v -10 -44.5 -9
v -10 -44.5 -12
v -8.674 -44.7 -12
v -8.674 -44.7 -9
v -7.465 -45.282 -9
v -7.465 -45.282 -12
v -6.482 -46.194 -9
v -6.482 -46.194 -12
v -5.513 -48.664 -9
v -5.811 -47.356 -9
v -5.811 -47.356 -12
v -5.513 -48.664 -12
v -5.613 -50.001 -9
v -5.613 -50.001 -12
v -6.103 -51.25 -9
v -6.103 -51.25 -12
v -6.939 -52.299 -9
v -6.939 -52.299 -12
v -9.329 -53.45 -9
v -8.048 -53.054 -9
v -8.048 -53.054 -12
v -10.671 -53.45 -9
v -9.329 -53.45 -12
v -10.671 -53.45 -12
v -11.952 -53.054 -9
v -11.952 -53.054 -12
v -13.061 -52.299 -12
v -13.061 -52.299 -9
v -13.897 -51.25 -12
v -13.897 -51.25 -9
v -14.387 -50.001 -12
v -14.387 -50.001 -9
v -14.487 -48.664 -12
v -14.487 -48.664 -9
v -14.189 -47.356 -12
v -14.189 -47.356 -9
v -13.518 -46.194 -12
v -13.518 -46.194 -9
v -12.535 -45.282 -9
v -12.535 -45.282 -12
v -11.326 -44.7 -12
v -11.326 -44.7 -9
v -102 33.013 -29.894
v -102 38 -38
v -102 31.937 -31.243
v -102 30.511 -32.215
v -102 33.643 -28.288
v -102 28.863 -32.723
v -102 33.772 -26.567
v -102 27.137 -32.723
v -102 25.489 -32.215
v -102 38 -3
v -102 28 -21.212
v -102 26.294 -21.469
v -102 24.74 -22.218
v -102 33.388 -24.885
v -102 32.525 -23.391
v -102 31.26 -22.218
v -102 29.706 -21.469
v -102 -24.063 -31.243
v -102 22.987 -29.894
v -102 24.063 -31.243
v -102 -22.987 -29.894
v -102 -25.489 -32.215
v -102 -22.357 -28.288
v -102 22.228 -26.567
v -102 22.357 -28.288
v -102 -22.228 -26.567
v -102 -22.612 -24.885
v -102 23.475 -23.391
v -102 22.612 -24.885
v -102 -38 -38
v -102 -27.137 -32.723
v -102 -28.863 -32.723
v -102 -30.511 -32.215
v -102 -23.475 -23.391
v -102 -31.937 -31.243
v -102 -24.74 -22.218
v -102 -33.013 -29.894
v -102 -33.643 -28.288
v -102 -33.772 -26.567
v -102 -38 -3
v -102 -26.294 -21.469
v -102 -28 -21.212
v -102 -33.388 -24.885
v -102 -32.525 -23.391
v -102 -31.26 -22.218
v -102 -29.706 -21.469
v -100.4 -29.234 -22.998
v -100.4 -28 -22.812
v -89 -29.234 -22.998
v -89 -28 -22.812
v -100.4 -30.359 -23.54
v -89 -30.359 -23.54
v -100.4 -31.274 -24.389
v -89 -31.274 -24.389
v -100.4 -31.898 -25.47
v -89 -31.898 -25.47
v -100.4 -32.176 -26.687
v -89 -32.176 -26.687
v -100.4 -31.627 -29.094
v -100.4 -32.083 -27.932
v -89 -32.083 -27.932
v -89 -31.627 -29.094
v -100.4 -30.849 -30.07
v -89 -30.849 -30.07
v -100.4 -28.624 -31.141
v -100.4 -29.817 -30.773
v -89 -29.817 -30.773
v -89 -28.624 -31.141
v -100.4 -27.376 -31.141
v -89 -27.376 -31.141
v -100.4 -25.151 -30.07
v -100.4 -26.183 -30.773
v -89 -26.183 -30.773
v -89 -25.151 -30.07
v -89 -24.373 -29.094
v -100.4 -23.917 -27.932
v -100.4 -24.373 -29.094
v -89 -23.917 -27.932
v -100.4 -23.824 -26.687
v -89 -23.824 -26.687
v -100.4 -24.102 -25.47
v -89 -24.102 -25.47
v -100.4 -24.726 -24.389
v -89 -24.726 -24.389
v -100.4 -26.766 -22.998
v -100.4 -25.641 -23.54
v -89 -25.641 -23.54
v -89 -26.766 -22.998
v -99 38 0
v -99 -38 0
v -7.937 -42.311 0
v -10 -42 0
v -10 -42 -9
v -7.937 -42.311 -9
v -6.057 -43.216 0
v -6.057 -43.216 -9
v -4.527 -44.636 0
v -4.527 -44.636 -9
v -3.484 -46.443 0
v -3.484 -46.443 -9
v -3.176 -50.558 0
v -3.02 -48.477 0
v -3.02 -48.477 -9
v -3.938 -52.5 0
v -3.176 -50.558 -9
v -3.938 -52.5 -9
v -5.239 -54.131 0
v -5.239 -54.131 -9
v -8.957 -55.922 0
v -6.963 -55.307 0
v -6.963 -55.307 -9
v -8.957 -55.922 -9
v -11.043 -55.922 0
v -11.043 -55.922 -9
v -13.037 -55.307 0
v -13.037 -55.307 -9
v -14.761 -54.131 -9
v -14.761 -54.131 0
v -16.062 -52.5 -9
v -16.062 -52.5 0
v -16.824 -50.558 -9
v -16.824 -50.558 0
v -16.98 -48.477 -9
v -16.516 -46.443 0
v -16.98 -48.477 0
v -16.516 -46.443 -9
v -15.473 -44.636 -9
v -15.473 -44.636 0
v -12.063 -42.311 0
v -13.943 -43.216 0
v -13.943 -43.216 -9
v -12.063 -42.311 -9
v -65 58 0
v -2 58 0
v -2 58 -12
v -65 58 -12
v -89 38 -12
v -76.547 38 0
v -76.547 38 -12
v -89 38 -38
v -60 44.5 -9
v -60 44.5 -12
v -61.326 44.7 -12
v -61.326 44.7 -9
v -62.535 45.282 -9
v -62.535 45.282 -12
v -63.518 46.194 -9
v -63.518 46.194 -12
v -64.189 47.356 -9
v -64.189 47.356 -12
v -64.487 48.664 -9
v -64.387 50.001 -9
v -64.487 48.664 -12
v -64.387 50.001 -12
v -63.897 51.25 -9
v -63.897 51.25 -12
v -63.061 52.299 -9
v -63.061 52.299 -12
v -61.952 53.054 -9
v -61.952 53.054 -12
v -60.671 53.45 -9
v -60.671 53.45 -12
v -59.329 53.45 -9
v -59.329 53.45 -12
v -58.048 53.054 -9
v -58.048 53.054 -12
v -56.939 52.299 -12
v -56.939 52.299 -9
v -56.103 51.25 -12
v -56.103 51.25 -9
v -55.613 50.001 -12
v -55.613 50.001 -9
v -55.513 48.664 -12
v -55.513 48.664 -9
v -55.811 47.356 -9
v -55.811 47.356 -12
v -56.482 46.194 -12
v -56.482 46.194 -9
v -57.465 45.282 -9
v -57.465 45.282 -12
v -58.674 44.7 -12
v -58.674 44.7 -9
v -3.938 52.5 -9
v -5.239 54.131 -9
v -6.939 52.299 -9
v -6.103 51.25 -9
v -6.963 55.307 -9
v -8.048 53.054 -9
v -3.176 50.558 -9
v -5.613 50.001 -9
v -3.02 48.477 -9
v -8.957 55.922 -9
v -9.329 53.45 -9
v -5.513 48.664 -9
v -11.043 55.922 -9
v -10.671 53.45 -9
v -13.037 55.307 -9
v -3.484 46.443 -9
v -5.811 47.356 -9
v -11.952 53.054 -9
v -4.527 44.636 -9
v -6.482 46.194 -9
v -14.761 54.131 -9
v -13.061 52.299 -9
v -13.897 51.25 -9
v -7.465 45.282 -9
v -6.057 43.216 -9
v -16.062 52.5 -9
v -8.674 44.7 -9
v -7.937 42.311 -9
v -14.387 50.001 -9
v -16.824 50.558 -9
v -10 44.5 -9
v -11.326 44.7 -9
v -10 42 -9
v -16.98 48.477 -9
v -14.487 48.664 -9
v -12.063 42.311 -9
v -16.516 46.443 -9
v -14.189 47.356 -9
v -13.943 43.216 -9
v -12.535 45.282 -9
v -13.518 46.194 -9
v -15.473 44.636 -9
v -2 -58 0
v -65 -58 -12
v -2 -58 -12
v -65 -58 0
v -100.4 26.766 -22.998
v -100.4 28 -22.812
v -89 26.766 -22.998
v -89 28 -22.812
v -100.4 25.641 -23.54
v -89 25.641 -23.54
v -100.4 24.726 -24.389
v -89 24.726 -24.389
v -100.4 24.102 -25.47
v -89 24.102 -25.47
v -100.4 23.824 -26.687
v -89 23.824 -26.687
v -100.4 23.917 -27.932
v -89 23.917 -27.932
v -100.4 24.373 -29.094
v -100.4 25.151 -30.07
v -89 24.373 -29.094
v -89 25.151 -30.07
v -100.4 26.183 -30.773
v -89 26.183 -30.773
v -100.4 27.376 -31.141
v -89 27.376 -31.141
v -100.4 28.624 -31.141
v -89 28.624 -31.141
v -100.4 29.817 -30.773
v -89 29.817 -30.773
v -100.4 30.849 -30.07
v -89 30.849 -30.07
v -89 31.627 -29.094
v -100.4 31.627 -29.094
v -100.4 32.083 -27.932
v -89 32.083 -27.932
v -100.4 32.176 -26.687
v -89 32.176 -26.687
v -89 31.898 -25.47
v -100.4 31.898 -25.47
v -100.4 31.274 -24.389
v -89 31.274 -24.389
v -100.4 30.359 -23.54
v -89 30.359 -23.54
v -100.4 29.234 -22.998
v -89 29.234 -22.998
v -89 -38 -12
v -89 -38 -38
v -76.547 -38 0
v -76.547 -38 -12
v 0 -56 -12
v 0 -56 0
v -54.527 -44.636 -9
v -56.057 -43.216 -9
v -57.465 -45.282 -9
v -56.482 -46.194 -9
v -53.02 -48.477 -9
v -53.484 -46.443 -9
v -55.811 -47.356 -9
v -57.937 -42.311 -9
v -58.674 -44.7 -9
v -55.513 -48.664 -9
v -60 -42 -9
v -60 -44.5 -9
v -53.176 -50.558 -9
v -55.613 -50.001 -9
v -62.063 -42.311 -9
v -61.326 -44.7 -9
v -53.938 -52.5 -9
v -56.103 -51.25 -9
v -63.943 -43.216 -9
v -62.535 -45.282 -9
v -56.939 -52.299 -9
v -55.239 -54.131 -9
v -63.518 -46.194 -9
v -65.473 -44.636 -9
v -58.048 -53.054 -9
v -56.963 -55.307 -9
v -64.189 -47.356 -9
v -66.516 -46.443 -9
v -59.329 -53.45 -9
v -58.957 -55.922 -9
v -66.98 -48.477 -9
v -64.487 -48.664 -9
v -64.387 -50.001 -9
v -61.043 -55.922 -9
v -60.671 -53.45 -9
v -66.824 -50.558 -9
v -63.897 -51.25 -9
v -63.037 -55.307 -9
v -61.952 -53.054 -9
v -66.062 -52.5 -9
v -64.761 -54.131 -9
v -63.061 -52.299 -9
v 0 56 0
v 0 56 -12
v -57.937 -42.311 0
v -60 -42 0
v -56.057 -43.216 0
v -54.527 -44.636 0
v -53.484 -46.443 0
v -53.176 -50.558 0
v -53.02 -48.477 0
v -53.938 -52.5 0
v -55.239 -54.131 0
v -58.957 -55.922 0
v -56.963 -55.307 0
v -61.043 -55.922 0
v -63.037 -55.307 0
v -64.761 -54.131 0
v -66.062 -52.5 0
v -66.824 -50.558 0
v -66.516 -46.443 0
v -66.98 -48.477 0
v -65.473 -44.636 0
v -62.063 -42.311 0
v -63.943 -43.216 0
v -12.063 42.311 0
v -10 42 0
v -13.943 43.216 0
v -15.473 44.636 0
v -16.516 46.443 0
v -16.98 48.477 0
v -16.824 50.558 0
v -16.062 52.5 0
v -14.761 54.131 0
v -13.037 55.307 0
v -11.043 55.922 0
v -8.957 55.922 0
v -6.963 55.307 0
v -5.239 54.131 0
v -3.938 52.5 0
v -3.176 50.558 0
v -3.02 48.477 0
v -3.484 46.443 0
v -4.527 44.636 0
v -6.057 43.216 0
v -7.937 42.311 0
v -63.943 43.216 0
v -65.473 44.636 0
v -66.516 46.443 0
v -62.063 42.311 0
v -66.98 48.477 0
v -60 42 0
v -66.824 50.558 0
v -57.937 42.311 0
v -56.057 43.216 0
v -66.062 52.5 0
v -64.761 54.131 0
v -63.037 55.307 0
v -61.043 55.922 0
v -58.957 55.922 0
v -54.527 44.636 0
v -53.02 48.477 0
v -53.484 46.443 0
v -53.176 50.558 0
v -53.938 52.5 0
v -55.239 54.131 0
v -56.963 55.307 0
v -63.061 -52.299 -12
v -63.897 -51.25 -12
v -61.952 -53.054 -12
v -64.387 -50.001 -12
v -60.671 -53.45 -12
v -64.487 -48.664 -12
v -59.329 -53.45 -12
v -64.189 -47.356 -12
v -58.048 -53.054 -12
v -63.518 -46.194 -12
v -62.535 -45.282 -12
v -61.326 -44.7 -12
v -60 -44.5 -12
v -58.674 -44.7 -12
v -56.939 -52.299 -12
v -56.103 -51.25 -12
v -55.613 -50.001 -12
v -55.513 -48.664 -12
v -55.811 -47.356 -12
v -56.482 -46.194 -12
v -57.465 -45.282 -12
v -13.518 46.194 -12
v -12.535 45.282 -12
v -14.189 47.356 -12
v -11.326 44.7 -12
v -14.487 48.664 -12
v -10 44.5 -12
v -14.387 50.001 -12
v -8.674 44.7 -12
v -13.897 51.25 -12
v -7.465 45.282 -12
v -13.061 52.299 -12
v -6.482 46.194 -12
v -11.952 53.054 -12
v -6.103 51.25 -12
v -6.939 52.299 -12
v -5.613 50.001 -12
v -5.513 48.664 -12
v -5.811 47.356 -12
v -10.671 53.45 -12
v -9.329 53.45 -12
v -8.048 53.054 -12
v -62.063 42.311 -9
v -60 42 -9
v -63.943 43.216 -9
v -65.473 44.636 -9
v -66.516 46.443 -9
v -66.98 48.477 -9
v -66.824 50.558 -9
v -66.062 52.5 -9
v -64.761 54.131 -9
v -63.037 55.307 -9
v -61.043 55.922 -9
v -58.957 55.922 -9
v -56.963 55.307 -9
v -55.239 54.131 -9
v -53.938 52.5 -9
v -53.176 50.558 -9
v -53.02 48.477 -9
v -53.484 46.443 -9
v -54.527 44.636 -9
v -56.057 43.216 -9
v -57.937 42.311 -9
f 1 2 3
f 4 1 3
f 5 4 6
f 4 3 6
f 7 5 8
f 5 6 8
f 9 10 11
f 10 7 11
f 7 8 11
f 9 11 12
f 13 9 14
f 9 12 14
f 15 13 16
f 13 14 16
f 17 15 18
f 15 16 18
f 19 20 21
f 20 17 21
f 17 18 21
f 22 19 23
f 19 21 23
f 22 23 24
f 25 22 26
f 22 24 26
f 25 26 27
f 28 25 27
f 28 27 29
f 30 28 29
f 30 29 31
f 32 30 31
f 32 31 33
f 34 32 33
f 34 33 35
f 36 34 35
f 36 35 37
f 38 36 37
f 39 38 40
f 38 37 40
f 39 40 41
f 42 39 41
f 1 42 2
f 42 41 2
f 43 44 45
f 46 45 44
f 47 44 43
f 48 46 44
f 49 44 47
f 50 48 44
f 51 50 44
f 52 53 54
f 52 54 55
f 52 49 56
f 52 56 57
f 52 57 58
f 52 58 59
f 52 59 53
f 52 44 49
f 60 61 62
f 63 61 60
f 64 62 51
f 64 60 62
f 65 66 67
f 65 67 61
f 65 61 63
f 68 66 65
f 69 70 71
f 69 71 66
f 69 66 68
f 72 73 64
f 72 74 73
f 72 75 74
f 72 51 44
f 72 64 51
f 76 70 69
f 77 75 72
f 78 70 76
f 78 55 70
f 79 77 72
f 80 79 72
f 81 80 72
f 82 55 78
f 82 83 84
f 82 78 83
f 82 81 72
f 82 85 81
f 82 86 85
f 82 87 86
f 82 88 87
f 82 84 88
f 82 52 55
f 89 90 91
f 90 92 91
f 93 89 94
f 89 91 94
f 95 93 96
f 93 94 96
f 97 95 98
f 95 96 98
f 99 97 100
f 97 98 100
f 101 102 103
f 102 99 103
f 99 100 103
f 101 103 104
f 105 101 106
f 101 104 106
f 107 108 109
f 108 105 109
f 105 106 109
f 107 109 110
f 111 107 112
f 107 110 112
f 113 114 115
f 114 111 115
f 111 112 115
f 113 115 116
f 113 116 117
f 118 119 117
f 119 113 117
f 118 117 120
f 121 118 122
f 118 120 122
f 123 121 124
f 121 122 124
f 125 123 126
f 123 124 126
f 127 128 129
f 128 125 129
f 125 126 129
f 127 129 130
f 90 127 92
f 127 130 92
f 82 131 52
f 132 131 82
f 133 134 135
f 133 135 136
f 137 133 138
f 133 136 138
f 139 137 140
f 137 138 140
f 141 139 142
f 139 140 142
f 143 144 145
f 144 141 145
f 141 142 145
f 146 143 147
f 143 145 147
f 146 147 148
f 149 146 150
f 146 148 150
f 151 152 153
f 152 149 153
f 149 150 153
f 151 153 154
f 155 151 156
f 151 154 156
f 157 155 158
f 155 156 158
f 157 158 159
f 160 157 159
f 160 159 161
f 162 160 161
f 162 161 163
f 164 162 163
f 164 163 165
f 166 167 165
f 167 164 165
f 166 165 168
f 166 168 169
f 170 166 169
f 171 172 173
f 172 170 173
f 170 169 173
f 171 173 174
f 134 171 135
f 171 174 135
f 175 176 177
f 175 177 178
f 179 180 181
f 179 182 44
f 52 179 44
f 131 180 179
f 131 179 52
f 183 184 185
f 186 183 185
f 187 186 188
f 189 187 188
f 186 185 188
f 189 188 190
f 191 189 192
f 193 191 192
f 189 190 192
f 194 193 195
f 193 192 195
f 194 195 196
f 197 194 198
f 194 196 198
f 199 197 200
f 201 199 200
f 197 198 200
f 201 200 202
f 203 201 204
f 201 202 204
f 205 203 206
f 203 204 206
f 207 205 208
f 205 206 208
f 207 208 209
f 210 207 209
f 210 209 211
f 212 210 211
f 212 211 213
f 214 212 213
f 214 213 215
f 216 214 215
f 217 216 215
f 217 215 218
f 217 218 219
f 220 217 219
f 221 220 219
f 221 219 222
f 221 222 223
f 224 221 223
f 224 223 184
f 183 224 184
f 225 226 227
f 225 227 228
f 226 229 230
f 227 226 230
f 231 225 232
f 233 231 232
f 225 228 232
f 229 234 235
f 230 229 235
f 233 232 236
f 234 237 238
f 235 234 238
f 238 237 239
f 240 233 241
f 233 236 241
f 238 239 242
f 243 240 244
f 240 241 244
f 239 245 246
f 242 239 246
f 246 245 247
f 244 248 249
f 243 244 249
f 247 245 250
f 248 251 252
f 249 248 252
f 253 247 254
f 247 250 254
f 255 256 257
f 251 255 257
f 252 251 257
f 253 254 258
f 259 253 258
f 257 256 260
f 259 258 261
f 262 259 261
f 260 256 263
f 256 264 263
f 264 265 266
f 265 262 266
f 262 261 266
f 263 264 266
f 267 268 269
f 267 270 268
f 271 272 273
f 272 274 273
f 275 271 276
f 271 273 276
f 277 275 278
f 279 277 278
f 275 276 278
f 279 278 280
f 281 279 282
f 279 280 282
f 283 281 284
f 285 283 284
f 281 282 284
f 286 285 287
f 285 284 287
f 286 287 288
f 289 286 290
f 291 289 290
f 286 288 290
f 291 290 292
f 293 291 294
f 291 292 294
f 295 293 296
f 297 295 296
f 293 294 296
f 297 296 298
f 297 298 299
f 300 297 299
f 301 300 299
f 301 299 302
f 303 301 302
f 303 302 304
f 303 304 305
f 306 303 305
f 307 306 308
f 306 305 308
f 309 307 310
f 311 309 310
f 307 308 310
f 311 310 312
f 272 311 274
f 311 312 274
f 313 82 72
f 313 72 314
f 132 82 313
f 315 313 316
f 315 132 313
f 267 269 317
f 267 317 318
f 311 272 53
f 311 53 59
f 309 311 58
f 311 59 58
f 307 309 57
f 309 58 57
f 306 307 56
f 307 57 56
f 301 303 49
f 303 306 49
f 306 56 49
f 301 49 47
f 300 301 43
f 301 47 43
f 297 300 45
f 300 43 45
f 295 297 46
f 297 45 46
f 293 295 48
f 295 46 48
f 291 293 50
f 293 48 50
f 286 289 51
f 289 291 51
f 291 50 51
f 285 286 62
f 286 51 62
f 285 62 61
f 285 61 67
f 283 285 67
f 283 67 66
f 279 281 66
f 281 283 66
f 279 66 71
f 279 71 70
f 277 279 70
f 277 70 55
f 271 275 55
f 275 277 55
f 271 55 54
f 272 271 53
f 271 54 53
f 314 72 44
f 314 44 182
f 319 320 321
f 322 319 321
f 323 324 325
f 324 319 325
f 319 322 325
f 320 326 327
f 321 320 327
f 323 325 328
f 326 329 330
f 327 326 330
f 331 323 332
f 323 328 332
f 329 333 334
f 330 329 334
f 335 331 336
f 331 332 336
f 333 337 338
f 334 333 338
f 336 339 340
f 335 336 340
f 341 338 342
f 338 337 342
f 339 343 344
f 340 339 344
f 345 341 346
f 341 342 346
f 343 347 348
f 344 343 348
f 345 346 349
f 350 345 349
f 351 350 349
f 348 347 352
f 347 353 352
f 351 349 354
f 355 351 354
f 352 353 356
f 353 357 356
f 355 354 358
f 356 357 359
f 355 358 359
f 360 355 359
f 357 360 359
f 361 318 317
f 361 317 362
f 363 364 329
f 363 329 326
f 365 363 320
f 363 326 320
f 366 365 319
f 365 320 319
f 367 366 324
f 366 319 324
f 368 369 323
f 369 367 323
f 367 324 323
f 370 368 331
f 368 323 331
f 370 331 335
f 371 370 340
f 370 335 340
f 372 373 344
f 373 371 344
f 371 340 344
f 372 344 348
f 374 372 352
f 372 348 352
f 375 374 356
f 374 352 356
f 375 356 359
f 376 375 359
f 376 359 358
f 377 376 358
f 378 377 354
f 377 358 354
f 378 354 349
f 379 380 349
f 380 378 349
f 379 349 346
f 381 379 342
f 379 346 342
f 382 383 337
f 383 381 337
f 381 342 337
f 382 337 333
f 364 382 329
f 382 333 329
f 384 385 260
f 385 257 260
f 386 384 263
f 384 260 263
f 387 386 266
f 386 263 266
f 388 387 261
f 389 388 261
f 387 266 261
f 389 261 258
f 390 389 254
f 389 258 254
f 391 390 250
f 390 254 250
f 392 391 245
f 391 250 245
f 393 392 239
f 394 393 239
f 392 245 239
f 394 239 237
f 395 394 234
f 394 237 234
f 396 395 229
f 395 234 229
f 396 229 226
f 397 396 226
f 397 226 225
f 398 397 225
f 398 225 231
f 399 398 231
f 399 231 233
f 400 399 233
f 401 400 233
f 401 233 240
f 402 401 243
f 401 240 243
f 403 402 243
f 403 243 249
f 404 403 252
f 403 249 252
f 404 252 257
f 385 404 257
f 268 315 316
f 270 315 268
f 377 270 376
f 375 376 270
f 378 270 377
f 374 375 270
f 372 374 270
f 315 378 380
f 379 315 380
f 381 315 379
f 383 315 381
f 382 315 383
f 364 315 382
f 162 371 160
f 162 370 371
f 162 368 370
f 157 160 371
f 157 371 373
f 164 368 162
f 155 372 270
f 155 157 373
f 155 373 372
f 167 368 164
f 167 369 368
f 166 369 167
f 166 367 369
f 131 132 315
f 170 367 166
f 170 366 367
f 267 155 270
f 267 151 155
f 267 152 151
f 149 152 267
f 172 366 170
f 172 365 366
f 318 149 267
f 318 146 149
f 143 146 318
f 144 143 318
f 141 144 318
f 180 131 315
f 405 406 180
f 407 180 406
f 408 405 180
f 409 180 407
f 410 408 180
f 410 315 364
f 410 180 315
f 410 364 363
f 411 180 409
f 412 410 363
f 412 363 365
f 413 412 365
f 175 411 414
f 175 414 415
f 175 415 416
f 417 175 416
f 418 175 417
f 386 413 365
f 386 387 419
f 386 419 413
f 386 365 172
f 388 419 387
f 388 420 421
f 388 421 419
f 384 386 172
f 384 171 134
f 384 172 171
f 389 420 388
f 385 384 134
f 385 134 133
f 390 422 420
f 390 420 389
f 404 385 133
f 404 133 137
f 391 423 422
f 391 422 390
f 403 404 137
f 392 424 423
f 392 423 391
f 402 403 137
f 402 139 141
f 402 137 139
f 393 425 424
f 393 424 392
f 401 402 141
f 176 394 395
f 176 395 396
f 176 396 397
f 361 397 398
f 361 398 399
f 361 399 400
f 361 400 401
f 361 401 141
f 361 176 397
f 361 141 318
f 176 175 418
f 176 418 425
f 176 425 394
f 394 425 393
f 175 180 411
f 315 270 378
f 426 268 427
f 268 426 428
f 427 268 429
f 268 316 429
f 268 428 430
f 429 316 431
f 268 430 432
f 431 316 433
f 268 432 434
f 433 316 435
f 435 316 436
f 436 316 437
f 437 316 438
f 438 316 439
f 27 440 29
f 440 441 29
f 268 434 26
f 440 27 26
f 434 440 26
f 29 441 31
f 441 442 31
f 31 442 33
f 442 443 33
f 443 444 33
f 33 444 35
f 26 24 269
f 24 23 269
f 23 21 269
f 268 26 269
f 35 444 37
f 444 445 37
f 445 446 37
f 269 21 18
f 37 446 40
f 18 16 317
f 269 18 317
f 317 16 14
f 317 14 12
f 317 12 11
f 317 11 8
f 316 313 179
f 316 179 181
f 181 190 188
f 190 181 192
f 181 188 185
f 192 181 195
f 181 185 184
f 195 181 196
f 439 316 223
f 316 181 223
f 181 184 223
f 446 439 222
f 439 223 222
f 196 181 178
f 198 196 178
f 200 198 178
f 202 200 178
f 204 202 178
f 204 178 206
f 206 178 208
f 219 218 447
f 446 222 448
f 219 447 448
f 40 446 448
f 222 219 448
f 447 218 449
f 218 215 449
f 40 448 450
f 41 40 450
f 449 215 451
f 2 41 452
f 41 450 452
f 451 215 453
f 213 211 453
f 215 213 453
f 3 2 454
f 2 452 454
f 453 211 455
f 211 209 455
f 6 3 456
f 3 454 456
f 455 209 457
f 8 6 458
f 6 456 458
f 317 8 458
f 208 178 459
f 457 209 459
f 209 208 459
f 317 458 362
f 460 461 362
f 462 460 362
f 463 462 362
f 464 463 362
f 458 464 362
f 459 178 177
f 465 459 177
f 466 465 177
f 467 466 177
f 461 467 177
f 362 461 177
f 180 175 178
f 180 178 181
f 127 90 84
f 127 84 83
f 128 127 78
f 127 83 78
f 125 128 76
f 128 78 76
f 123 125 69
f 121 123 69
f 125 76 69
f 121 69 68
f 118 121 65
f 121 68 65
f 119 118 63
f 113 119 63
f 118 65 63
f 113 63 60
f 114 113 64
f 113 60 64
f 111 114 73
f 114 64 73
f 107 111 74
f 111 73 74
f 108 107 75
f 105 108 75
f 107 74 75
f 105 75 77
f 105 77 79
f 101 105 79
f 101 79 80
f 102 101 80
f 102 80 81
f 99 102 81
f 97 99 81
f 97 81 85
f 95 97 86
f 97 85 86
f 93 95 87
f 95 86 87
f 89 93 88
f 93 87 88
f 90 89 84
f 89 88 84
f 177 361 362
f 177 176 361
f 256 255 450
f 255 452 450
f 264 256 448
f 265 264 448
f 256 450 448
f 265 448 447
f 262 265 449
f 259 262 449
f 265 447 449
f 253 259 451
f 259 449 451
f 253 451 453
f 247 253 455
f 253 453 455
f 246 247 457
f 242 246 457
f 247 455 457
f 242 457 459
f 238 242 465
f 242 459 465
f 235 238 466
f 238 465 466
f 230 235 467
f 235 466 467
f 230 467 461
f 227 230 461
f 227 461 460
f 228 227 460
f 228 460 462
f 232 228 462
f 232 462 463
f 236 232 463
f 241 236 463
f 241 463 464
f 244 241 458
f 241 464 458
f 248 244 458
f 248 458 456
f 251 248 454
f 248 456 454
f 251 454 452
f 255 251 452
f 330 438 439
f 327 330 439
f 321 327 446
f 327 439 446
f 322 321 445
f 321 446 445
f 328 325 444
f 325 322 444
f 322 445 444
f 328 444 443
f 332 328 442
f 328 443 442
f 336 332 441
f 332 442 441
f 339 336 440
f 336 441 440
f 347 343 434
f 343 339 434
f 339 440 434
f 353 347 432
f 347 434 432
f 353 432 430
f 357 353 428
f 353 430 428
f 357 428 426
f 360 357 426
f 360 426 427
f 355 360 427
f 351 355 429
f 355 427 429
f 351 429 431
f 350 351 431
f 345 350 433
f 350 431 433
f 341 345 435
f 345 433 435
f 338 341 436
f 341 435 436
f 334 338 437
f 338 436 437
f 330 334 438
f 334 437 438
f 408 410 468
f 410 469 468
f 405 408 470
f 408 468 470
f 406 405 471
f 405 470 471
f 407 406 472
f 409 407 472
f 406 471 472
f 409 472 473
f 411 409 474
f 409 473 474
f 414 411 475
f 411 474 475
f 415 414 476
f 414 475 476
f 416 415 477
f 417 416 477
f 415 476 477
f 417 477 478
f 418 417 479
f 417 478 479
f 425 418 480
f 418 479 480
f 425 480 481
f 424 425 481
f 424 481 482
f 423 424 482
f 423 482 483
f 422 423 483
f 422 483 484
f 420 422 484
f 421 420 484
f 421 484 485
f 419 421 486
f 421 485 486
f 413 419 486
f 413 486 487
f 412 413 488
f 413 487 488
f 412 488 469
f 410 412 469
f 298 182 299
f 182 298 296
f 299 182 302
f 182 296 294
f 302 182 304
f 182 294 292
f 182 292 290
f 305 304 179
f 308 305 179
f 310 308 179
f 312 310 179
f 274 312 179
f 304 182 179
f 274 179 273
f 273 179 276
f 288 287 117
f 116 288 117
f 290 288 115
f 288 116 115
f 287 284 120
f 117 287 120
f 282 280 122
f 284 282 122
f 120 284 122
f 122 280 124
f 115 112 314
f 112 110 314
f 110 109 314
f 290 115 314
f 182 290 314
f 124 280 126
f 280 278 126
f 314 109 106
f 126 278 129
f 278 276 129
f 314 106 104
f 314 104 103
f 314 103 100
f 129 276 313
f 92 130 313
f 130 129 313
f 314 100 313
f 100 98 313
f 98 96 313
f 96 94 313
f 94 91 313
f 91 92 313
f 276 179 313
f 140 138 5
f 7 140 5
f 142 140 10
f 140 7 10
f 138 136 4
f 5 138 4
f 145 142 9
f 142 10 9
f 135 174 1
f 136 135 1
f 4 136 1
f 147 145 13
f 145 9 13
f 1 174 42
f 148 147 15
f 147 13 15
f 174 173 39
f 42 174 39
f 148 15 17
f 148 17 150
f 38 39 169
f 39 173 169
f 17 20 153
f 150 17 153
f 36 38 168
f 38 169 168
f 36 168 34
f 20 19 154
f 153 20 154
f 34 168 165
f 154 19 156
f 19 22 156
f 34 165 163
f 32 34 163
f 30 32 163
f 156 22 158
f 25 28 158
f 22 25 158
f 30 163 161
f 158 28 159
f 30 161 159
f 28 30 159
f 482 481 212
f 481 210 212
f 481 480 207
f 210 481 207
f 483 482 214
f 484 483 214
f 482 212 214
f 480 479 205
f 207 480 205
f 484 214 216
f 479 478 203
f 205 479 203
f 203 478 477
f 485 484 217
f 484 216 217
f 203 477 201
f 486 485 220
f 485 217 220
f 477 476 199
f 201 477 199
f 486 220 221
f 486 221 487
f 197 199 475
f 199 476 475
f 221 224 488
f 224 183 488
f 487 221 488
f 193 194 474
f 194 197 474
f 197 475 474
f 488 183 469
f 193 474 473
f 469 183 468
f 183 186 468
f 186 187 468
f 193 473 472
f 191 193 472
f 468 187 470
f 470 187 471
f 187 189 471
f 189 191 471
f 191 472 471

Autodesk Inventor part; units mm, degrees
ref_plane "YZ Plane" through (0, 0, 0) normal (1, 0, 0) x (0, 1, 0)
ref_plane "XZ Plane" through (0, 0, 0) normal (0, 1, 0) x (-1, 0, 0)
ref_plane "XY Plane" through (0, 0, 0) normal (0, 0, 1) x (1, 0, 0)
sketch "Эскиз1" plane through (0, 0, 0) normal (0, 0, 1) x (1, 0, 0)
  line L0 (0, 0) -> (0, 58)
  line L1 (0, 58) -> (-65, 58)
  line L2 (-65, 58) -> (-76.547, 38)
  line L3 (-76.547, 38) -> (-102, 38)
  line L4 (-102, 38) -> (-102, 0)
  line L5 (-102, 0) -> (0, 0)
  line L6 (-89, 38) -> (-89, 0)
  point P0 (-60, 49)
  point P1 (-10, 49)
  dimension "d0" = 116
  dimension "d1" = 76
  dimension "d2" = 60
  dimension "d3" = 65
  dimension "d4" = 102
  dimension "d5" = 13
  dimension "d6" = 50
  dimension "d7" = 10
  dimension "d8" = 98
extrude "Выдавливание1" add sketch "Эскиз1" against normal blind 12 contours L5 L6 L3 L2 L1 L0
extrude "Выдавливание2" add sketch "Эскиз1" against normal blind 38 contours L5 L4 L3 L6
hole "Отверстие1" at (-60, 49, 0) at (-10, 49, 0) direction (0, 0, -1) diameter 9 end through all counterbore diameter 14 counterbore depth 9
hole "Отверстие2" at (-102, 28, -27) direction (1, 0, 0) diameter 8.376 end through all thread size "M10x1.5" class "6H" standard "ISO Metric profile"
chamfer "Фаска1" distance 1.6 angle 45 1 edges at (-102, 28, -31.188)
chamfer "Фаска2" distance 3 angle 45 1 edges at (-102, 19, 0)
chamfer "Фаска3" distance 2 angle 45 1 edges at (0, 58, -6)
mirror "Зеркальное отражение1" about plane through (0, 0, 0) normal (0, -1, 0)
properties part number "Крышка 6"
